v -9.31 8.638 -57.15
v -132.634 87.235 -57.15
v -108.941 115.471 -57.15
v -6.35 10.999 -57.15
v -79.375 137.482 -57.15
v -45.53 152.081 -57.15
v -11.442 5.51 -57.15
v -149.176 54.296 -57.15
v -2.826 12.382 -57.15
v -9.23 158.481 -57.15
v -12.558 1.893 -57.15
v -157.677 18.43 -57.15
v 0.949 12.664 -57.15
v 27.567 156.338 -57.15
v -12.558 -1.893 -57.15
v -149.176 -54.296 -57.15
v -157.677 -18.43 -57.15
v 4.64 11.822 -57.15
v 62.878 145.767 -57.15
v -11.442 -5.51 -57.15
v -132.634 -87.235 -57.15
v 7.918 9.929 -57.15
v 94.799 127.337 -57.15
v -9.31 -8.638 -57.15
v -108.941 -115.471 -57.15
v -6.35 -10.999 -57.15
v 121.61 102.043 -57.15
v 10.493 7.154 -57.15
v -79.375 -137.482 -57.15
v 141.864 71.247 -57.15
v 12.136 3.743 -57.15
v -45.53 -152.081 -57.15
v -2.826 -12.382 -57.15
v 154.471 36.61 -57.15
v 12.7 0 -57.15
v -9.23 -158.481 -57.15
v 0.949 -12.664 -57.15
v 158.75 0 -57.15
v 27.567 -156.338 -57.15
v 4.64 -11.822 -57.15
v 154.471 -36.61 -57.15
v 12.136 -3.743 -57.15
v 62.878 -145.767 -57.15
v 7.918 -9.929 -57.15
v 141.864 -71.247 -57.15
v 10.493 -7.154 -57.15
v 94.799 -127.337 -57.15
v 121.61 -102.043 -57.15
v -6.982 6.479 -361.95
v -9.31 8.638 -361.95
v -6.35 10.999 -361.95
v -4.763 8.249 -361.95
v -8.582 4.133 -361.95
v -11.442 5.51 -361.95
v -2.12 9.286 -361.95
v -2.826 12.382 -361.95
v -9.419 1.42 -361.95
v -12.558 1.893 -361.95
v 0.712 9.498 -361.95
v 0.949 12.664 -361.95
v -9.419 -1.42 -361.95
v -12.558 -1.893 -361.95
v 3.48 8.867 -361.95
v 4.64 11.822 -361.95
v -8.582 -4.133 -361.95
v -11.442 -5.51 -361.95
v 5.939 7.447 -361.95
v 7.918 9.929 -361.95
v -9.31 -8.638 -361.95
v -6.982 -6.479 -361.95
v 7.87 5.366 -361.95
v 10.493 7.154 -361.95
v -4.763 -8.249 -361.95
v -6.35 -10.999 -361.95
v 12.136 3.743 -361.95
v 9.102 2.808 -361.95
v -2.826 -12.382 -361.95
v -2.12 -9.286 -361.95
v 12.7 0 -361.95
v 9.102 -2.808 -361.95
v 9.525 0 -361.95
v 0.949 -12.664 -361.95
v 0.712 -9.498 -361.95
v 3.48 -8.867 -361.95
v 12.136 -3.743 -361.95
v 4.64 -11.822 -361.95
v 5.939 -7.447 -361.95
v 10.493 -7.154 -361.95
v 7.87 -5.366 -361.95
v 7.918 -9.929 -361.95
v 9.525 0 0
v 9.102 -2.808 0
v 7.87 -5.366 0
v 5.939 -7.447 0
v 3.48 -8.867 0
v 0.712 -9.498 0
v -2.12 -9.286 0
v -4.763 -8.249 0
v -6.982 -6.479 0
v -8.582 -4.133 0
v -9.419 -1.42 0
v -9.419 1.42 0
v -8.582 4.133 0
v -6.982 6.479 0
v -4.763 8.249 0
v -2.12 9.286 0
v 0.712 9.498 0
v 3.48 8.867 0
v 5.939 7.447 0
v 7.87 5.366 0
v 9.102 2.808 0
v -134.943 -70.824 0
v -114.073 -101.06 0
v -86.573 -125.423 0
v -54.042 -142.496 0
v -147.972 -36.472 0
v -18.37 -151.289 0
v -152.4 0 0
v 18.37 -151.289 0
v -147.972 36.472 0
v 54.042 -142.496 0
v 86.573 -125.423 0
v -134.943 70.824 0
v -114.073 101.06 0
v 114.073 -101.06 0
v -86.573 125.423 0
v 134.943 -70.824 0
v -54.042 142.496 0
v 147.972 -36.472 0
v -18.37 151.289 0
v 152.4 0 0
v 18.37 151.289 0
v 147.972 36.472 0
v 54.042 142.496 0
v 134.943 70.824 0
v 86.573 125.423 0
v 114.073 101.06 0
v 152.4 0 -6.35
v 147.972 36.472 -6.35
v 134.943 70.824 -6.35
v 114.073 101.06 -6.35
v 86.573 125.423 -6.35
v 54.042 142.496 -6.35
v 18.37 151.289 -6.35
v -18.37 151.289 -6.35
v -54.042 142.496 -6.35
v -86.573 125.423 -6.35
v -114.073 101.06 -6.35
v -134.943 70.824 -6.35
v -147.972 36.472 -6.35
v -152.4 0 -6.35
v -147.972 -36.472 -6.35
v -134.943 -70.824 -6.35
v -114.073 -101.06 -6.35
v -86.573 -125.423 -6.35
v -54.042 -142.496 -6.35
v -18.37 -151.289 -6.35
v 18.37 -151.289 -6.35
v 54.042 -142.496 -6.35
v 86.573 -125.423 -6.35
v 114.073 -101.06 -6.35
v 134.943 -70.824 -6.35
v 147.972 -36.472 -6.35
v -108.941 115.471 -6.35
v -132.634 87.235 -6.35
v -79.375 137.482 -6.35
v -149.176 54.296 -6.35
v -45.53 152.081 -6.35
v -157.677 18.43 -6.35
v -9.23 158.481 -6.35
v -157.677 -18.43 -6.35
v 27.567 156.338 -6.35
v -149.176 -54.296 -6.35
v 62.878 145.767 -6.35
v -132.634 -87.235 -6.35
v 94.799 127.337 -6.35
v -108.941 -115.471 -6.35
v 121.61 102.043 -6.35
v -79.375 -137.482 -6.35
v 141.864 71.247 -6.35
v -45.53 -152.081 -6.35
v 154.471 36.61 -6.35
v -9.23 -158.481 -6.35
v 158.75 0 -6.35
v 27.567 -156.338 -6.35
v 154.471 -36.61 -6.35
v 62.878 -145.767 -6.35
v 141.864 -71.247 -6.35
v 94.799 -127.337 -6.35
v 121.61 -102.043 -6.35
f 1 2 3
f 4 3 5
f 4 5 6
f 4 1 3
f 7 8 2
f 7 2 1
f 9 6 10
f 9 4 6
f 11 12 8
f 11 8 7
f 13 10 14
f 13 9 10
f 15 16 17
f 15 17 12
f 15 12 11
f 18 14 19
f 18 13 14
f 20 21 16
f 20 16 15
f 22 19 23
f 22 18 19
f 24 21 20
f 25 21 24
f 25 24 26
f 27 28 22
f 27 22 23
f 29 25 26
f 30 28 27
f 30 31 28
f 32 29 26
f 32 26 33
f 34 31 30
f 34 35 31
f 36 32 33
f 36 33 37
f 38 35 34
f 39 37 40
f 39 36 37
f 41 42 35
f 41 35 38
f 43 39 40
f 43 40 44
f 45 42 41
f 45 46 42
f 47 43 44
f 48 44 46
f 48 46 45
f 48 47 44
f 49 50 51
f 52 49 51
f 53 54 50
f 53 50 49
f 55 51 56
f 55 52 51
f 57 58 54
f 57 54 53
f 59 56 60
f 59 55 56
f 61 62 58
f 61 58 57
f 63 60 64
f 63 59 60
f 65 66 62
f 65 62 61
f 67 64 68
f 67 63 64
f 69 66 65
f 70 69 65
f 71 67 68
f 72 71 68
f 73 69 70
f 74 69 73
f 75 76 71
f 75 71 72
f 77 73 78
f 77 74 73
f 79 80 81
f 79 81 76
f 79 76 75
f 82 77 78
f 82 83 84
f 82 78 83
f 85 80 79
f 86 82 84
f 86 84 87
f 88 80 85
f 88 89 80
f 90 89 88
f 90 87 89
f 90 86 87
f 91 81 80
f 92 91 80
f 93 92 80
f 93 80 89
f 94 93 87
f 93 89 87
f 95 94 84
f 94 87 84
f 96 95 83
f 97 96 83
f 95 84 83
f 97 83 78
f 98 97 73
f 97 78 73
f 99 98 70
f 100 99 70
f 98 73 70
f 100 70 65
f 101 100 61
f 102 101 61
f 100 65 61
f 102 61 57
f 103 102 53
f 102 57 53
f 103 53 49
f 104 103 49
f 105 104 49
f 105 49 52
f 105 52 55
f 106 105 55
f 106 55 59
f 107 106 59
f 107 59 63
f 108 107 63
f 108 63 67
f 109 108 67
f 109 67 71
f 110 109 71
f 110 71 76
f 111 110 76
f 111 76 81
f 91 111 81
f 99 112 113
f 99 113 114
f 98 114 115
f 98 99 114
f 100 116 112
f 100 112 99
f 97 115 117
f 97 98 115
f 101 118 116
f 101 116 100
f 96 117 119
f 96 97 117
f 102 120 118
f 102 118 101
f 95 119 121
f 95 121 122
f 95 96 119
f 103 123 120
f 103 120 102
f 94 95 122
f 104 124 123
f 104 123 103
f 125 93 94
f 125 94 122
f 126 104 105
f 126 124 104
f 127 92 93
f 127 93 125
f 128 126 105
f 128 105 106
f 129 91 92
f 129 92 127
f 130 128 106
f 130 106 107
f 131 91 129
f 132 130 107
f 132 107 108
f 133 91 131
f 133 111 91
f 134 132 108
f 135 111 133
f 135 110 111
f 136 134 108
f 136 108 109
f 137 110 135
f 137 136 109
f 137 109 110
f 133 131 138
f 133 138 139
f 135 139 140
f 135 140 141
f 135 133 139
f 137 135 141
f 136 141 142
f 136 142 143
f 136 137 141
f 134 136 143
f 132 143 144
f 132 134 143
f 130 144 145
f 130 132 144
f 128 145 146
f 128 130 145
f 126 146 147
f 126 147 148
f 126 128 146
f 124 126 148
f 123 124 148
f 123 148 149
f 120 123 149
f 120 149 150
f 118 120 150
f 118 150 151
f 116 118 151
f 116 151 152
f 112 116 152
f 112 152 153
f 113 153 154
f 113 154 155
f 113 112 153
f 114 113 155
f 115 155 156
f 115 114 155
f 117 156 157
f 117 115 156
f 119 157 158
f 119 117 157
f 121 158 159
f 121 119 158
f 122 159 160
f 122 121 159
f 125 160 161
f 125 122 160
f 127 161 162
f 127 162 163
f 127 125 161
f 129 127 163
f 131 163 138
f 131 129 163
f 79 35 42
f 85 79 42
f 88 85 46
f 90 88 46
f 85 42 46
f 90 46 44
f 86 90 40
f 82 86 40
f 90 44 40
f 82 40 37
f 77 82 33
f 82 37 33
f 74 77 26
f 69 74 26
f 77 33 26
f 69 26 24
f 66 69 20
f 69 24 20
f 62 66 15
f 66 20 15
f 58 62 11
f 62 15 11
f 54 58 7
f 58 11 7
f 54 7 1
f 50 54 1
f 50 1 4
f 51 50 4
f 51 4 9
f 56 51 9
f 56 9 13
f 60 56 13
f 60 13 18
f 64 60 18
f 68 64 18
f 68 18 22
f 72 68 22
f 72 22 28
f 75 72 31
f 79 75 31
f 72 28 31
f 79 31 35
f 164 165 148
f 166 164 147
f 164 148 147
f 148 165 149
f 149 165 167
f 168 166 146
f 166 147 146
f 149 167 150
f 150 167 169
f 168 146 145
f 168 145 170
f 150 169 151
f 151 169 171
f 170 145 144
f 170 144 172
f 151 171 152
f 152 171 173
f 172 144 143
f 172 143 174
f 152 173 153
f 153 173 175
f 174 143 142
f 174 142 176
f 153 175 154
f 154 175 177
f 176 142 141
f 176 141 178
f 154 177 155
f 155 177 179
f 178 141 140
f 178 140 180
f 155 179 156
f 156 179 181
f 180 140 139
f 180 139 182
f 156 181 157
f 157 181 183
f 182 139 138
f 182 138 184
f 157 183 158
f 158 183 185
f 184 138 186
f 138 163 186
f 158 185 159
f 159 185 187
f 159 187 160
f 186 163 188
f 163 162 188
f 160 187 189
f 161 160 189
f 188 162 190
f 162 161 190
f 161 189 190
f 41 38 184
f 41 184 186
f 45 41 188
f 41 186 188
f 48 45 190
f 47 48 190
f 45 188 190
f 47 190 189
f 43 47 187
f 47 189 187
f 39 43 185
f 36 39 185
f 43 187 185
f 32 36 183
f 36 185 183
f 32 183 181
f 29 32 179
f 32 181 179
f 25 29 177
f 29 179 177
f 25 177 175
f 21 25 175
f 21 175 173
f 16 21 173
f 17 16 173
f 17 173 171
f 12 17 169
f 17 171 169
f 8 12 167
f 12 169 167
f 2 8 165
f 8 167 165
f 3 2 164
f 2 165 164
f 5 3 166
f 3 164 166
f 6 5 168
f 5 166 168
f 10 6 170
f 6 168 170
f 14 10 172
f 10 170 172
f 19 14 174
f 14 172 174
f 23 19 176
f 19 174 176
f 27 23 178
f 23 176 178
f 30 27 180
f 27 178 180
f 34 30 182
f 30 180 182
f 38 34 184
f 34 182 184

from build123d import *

# Parameters (mm, degrees)
F0_R     = 152.4
F1_DEPTH = 6.35
F2_R     = 158.75
F3_DEPTH = 50.8
F4_R     = 6.35
F5_DEPTH = 57.151
F6_R     = 12.7
F7_DEPTH = 304.8
F8_R     = 9.525
F9_DEPTH = 361.951


with BuildPart() as f1:
    # F0 (on Top) → F1 (new body)
    with BuildSketch(Plane.XY):
        Circle(F0_R)
    extrude(amount=-F1_DEPTH)

    # F2 (on face) → F3 (join)
    with BuildSketch(Plane(origin=(0, 0, -6.35), x_dir=(1, 0, 0), z_dir=(0, 0, -1))):
        Circle(F2_R)
    extrude(amount=F3_DEPTH)

    # F4 (on face) → F5 (cut, through all)
    with BuildSketch(Plane.XY):
        Circle(F4_R)
    extrude(amount=-F5_DEPTH, mode=Mode.SUBTRACT)

    # F6 (on face) → F7 (join)
    with BuildSketch(Plane(origin=(0, 0, -57.15), x_dir=(1, 0, 0), z_dir=(0, 0, -1))):
        Circle(F6_R)
    extrude(amount=F7_DEPTH)

    # F8 (on face) → F9 (cut, through all)
    with BuildSketch(Plane(origin=(0, 0, -361.95), x_dir=(1, 0, 0), z_dir=(0, 0, -1))):
        Circle(F8_R)
    extrude(amount=-F9_DEPTH, mode=Mode.SUBTRACT)


solid = f1.part
